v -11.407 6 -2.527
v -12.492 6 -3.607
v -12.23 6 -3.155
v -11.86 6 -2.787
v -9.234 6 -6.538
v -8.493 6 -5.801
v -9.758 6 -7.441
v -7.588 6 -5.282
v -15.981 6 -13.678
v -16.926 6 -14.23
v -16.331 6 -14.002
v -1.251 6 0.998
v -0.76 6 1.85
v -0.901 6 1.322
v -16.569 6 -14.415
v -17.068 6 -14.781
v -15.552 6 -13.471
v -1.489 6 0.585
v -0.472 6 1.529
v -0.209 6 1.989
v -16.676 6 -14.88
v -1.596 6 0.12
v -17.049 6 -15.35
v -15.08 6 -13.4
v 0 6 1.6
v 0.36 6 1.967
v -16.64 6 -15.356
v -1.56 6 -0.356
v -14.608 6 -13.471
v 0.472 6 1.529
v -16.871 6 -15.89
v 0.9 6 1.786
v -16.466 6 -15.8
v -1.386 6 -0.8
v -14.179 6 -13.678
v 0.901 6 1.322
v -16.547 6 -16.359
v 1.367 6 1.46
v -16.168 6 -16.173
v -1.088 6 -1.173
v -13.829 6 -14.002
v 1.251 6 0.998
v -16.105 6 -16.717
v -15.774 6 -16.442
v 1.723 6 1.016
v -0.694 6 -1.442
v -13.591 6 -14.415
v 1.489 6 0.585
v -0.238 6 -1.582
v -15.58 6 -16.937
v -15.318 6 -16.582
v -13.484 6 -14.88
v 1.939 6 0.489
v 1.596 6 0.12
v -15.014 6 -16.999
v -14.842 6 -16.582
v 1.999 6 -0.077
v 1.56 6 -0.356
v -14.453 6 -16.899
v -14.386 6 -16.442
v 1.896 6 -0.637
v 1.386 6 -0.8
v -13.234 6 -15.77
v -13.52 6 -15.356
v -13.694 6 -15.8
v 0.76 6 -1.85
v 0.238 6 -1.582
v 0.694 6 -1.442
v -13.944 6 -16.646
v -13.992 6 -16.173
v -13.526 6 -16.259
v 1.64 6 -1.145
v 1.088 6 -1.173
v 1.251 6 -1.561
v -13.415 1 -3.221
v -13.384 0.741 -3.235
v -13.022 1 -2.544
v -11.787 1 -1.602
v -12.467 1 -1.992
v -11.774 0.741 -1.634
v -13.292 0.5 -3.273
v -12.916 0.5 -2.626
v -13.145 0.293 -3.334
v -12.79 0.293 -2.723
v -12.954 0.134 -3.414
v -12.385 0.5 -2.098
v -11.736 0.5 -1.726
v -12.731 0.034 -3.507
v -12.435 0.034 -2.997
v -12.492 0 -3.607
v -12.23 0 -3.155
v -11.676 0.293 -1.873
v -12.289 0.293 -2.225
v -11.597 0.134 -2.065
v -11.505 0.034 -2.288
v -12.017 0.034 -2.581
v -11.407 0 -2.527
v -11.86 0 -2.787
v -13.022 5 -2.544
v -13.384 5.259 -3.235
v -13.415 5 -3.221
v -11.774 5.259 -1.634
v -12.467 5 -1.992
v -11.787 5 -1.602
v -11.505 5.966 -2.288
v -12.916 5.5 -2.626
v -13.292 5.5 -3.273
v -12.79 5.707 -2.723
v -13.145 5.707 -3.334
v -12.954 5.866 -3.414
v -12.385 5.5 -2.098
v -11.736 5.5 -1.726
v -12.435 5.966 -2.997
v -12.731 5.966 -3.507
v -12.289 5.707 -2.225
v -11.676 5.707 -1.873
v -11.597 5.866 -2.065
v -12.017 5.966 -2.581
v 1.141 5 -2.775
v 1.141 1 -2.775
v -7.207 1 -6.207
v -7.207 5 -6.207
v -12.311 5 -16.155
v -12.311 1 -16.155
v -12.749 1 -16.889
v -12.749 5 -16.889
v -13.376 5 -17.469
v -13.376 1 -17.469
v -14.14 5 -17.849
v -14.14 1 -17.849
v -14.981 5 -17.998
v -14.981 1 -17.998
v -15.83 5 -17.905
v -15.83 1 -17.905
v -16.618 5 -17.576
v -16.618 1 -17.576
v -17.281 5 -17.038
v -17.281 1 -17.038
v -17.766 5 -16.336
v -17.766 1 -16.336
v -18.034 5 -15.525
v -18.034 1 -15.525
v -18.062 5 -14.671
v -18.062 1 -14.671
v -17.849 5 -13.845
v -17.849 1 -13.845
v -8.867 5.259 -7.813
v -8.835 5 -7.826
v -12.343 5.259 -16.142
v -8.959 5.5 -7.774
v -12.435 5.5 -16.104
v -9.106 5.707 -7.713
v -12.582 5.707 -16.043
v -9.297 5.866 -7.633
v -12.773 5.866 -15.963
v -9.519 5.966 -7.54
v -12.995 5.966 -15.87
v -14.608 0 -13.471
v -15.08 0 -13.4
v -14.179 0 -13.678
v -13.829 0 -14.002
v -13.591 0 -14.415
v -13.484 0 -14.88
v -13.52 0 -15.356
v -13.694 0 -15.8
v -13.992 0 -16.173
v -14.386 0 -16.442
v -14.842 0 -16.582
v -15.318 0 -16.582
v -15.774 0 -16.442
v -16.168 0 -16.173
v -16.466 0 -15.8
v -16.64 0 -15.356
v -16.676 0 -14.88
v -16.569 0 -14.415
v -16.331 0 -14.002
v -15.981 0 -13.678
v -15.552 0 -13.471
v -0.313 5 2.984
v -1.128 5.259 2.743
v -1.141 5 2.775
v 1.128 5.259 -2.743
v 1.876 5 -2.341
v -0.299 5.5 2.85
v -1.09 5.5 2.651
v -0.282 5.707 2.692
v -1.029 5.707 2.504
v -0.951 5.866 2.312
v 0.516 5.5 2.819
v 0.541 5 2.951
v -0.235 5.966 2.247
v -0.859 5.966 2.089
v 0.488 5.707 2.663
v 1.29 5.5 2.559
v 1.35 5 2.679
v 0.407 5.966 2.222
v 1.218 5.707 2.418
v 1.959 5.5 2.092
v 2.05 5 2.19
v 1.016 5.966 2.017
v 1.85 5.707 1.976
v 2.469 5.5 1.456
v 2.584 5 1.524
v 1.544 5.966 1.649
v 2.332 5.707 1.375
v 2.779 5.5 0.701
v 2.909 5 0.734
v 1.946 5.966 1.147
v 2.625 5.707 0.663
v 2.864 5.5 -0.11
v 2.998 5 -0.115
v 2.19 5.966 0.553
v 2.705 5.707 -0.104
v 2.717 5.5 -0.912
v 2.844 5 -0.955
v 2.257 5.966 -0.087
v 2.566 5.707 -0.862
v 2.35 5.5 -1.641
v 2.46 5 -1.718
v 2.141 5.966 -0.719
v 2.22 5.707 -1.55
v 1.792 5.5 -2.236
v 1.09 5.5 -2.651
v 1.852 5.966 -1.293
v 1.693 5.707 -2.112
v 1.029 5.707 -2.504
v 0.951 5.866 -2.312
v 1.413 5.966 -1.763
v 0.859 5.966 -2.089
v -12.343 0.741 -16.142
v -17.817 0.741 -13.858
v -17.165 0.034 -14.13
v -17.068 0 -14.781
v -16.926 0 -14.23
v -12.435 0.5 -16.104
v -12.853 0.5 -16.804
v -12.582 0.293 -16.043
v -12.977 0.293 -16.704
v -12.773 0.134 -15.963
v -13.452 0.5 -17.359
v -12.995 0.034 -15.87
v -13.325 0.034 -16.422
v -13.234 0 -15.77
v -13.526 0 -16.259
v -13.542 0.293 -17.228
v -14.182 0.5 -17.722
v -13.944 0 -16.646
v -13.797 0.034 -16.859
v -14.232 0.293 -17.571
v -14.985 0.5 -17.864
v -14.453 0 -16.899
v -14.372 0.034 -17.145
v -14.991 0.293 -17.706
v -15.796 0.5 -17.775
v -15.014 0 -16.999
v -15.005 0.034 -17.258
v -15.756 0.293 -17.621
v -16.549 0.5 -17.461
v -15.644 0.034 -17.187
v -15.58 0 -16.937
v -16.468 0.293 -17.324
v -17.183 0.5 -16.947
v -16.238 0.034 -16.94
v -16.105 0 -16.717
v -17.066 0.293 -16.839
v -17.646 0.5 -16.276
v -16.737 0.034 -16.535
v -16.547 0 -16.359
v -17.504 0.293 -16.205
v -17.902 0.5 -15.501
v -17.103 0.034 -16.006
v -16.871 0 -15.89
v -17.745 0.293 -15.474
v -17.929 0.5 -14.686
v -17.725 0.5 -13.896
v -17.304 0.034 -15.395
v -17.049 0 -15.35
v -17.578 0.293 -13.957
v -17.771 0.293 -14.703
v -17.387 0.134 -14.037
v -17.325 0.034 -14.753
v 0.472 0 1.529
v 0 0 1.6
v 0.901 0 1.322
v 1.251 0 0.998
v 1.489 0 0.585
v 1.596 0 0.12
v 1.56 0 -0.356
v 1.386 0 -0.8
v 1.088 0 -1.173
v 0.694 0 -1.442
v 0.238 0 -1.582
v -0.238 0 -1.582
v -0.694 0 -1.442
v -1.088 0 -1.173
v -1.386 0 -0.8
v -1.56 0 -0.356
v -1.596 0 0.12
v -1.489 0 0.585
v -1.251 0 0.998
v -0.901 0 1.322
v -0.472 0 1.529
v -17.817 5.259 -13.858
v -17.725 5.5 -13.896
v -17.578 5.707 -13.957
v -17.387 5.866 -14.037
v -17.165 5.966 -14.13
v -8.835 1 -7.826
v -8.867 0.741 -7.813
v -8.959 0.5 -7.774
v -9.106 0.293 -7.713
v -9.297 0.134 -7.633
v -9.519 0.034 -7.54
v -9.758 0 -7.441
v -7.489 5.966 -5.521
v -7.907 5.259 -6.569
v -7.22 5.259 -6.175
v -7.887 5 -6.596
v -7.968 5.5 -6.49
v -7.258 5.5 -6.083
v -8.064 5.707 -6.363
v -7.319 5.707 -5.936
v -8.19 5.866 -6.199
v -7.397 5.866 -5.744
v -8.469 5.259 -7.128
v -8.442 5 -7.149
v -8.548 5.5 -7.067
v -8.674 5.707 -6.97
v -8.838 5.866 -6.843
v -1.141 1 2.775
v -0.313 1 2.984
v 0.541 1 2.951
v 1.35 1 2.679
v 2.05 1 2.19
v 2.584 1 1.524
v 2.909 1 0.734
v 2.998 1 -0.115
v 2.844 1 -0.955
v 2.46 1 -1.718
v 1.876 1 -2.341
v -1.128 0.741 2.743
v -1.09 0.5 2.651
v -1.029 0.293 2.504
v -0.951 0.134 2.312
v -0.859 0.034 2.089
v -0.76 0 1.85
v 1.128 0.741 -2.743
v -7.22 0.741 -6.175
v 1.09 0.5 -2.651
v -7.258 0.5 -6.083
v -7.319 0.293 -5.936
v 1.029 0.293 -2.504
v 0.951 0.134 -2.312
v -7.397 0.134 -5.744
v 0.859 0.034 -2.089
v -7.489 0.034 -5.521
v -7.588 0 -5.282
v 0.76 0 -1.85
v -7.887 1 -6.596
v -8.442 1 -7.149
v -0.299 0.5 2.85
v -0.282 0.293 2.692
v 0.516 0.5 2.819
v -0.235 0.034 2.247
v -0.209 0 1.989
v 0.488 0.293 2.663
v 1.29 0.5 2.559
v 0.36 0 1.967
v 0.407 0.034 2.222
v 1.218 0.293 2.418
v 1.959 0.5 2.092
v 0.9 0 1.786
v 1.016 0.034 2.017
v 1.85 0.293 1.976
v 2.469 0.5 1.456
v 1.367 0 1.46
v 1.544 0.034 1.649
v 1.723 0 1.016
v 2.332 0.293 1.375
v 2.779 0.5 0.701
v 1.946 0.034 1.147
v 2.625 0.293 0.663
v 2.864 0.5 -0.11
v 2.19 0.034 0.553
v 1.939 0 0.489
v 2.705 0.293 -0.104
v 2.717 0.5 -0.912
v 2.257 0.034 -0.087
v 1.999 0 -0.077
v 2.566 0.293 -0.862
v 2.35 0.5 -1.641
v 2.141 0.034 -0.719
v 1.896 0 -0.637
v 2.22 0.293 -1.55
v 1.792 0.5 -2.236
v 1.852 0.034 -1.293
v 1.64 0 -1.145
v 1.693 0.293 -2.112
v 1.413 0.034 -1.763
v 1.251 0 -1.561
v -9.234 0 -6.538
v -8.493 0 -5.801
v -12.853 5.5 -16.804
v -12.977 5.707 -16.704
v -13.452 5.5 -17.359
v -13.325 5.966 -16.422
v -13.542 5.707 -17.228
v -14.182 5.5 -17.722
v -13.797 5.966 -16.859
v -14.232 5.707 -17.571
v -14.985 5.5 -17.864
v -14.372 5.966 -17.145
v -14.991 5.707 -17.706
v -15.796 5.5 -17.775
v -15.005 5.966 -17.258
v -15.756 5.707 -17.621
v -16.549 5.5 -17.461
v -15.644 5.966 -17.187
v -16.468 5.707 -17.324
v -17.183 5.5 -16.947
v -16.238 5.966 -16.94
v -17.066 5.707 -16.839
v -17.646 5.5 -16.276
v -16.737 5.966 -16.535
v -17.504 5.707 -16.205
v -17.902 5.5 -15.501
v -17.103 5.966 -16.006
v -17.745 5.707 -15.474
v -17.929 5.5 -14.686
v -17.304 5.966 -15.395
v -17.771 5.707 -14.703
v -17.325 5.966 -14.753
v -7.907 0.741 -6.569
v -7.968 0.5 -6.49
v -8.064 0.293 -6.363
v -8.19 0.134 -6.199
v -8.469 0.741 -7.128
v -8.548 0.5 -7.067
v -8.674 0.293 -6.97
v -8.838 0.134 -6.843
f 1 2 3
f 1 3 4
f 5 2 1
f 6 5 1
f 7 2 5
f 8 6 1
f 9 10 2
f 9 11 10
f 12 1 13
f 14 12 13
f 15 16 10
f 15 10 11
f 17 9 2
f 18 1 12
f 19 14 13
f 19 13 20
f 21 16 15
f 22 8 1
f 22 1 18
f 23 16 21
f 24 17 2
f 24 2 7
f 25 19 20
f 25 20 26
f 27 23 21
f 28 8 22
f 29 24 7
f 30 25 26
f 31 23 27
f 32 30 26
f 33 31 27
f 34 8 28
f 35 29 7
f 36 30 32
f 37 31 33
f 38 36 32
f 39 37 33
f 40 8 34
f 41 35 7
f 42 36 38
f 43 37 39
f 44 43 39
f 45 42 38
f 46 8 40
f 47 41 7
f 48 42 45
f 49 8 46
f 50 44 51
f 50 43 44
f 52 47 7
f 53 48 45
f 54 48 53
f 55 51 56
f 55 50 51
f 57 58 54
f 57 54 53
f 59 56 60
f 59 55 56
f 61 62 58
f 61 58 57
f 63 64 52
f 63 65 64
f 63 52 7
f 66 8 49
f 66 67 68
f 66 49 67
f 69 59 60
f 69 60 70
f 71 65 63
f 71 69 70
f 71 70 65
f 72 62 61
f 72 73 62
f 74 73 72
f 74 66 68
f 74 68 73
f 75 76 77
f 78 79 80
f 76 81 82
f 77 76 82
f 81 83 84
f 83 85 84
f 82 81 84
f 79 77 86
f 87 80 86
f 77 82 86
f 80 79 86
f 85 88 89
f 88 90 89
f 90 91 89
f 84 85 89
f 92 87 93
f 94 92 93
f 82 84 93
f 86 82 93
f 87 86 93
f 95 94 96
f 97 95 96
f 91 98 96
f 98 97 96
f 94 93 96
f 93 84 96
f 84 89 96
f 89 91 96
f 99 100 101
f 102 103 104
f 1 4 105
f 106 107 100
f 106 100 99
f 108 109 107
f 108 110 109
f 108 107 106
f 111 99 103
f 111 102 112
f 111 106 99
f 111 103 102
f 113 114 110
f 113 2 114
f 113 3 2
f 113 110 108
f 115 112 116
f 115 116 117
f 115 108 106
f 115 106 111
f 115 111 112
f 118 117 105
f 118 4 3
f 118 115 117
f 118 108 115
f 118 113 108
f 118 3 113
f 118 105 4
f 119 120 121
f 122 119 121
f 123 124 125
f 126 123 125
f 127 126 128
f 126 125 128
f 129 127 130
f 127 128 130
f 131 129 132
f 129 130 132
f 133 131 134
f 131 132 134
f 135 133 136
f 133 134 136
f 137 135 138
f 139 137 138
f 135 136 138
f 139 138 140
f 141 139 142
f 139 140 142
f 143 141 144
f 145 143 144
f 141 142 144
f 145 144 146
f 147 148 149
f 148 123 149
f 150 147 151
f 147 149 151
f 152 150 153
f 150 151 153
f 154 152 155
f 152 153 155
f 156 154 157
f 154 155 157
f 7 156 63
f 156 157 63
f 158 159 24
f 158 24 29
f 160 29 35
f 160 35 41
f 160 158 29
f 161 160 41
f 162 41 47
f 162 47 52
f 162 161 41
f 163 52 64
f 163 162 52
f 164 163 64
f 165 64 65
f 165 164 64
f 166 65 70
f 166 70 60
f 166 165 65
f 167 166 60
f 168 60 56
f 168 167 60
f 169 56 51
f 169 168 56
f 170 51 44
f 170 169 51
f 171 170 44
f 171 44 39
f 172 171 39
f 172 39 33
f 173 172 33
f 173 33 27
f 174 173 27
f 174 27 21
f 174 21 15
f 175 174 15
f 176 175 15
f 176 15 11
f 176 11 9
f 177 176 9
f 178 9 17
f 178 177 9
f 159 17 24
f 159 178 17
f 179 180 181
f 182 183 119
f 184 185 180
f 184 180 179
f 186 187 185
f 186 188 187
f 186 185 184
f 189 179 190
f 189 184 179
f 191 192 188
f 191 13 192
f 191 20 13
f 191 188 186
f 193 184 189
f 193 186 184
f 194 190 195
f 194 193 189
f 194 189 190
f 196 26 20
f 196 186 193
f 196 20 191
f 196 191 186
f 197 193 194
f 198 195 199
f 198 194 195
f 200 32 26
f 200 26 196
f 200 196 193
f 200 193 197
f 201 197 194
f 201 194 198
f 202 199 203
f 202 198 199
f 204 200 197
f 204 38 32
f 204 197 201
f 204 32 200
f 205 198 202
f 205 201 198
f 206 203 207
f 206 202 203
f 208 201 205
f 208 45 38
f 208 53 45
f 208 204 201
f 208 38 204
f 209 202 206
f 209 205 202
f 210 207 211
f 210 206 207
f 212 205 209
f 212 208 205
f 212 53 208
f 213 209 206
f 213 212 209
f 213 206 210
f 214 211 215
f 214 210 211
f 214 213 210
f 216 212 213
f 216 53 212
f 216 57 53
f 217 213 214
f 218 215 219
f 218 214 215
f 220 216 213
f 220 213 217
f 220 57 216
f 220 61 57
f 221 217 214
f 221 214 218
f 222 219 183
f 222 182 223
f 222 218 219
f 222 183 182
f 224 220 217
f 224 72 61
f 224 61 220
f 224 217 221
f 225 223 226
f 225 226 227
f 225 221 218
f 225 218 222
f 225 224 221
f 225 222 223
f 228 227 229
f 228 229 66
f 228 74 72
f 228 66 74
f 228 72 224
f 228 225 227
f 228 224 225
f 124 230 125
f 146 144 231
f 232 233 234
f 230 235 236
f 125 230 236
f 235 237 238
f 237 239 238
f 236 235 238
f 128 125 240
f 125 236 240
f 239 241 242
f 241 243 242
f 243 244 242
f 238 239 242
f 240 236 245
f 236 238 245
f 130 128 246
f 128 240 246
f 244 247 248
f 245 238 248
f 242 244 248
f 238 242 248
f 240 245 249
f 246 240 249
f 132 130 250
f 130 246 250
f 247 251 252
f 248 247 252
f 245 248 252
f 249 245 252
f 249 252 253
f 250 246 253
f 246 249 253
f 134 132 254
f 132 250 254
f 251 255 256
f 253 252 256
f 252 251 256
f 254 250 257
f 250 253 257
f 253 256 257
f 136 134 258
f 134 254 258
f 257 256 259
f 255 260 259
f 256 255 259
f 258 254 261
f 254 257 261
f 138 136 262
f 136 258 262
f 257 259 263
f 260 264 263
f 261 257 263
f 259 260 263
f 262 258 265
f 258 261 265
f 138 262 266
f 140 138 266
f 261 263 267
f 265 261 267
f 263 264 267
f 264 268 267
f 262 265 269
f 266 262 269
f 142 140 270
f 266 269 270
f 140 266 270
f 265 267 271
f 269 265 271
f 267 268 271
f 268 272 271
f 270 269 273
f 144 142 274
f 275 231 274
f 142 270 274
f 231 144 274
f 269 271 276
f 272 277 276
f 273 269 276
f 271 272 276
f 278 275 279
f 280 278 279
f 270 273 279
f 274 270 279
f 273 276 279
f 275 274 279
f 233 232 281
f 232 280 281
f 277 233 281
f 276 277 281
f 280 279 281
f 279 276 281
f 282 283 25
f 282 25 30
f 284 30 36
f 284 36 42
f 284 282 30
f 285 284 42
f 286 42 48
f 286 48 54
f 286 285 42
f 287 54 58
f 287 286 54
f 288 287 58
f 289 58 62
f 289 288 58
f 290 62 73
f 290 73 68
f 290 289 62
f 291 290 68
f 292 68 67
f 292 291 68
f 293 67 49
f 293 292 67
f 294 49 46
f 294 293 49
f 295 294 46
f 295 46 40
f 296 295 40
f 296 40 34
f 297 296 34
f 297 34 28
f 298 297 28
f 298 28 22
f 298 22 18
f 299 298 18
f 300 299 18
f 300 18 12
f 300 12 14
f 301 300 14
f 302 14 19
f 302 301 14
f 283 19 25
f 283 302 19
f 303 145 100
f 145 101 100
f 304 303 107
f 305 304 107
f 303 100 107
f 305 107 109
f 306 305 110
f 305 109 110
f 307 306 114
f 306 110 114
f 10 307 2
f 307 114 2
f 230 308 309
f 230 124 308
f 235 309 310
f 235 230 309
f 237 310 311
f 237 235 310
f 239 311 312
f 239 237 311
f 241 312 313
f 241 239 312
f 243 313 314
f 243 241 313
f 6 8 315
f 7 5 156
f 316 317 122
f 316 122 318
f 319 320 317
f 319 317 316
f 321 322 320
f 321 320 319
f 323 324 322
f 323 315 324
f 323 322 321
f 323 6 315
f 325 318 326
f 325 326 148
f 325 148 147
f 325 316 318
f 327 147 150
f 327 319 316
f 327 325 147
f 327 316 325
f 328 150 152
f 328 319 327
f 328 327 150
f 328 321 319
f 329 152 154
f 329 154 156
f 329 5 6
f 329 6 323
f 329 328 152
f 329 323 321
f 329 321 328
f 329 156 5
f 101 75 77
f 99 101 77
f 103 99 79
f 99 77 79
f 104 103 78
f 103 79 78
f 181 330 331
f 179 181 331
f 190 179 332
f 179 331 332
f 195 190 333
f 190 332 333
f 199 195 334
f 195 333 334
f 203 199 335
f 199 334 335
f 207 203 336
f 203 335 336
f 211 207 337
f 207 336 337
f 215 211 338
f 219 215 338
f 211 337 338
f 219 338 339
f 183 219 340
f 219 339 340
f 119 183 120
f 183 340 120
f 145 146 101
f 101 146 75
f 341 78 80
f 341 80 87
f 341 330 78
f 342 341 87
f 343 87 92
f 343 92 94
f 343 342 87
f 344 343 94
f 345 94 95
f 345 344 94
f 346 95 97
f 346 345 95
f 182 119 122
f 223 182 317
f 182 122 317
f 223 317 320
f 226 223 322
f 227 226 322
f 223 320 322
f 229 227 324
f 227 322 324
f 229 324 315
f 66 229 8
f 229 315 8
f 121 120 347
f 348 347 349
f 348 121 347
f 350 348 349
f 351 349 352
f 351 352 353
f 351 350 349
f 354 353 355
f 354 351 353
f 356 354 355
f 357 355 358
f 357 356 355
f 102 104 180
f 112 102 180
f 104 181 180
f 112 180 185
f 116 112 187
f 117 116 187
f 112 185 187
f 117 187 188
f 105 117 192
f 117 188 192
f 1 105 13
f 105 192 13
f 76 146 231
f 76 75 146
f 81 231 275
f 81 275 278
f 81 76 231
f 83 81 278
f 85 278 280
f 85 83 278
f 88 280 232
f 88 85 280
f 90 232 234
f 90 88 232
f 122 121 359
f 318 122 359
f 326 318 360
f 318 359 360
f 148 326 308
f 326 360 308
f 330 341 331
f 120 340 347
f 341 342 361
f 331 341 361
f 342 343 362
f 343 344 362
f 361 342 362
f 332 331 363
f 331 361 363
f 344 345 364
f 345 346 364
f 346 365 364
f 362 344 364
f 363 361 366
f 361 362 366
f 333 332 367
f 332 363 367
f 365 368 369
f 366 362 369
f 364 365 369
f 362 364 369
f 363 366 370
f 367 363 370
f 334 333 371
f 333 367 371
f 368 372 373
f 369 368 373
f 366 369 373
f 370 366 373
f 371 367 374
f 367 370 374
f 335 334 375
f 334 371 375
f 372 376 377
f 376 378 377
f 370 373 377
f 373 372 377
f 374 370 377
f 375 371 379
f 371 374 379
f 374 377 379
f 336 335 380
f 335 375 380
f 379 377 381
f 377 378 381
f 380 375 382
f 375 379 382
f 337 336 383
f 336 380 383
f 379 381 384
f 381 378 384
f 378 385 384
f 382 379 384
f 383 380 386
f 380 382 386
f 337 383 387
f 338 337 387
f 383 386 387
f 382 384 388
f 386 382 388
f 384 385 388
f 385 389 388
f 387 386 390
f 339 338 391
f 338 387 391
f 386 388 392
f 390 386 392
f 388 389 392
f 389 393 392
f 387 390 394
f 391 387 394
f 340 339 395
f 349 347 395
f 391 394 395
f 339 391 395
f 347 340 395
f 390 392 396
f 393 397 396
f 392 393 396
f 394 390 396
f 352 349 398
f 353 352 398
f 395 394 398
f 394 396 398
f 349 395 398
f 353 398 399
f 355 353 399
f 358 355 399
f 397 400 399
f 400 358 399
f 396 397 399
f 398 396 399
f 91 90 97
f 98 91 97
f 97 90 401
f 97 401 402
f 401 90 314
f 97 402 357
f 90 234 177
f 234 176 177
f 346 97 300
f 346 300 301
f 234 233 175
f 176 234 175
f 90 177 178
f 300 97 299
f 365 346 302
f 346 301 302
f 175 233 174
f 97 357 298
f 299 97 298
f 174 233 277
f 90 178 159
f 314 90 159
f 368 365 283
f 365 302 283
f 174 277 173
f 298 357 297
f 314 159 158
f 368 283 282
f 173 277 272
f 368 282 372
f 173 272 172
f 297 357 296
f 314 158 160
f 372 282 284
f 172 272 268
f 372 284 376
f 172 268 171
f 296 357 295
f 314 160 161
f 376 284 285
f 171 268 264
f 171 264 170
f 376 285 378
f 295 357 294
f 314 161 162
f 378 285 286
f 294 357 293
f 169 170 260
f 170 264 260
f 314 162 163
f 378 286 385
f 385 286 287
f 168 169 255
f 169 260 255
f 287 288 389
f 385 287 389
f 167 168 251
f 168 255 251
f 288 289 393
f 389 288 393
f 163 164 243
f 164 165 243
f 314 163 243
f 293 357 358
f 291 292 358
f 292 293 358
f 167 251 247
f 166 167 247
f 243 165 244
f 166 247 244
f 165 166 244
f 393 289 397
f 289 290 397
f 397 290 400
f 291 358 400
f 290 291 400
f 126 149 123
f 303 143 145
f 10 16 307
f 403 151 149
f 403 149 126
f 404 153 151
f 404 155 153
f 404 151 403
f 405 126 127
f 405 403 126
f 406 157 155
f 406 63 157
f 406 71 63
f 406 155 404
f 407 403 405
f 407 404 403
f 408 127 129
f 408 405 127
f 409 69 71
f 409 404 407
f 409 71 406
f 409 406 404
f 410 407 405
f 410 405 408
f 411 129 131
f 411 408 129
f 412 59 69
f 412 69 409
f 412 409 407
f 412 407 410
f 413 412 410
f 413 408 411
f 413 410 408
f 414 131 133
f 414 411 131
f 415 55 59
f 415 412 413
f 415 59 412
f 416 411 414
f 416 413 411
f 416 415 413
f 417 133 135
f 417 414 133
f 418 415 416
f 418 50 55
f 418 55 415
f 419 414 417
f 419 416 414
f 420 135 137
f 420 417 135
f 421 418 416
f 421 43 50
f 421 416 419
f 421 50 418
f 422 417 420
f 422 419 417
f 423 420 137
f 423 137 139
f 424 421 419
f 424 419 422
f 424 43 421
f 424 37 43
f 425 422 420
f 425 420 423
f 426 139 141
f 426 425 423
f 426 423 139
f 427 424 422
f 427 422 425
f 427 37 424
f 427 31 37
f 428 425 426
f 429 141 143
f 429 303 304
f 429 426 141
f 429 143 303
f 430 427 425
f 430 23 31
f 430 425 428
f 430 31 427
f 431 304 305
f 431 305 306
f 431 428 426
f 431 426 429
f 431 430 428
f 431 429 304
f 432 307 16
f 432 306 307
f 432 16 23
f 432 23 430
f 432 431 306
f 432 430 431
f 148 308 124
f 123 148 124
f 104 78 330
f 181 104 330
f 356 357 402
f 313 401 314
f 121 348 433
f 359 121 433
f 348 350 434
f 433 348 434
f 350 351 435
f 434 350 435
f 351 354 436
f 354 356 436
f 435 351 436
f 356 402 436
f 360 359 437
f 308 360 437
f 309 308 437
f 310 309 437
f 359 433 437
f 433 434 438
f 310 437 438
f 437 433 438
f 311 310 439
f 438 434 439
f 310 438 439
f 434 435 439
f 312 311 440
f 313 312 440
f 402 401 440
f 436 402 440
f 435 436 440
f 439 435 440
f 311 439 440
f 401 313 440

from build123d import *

# Parameters (mm, degrees)
SKETCH1_R           = 1.6
BOSS_EXTRUDE1_DEPTH = 6
FILLET2_R           = 1


with BuildPart() as part:
    # Sketch1 → Boss-Extrude1 (new body)
    with BuildSketch(Plane(origin=(0, 0, 0), x_dir=(1, 0, 0), z_dir=(0, 1, 0))):
        with BuildLine():
            Line((-17.848575481, 13.84458241), (-13.415177199, 3.22141215))
            ThreePointArc((-13.415177199, 3.22141215), (-12.76227277, 2.249875109), (-11.787276601, 1.60214763))
            Line((-11.787276601, 1.60214763), (-1.140674884, -2.77468211))
            ThreePointArc((-1.140674884, -2.77468211), (2.77468211, -1.140674884), (1.140674884, 2.77468211))
            Line((1.140674884, 2.77468211), (-7.207304912, 6.206545835))
            ThreePointArc((-7.207304912, 6.206545835), (-8.18230108, 6.854273314), (-8.835205509, 7.825810355))
            Line((-8.835205509, 7.825810355), (-12.311424519, 16.15541759))
            ThreePointArc((-12.311424519, 16.15541759), (-16.23541759, 17.768575481), (-17.848575481, 13.84458241))
        make_face()
        with Locations(Location((-15.08, 15, 0), (0, 0, 270))):
            Circle(SKETCH1_R, mode=Mode.SUBTRACT)
        with Locations(Location((0, 0, 0), (0, 0, 270))):
            Circle(SKETCH1_R, mode=Mode.SUBTRACT)
    extrude(amount=BOSS_EXTRUDE1_DEPTH)

    # Fillet2
    fillet2_edges = [part.edges().sort_by_distance(p)[0] for p in [
        (-15.63187634, 0, -8.53299728),
        (-16.23541759, 0, -17.768575481),
        (-10.573315014, 0, -11.990613972),
        (-8.18230108, 0, -6.854273314),
        (-16.23541759, 6, -17.768575481),
        (-15.63187634, 6, -8.53299728),
        (-12.76227277, 6, -2.249875109),
        (-6.463975743, 6, 0.58626724),
        (2.77468211, 6, 1.140674884),
        (-3.033315014, 6, -4.490613972),
        (-8.18230108, 6, -6.854273314),
        (-3.033315014, 0, -4.490613972),
        (-10.573315014, 6, -11.990613972),
        (2.77468211, 0, 1.140674884),
        (-6.463975743, 0, 0.58626724),
        (-12.76227277, 0, -2.249875109),
    ]]
    fillet(fillet2_edges, radius=FILLET2_R)


solid = part.part
